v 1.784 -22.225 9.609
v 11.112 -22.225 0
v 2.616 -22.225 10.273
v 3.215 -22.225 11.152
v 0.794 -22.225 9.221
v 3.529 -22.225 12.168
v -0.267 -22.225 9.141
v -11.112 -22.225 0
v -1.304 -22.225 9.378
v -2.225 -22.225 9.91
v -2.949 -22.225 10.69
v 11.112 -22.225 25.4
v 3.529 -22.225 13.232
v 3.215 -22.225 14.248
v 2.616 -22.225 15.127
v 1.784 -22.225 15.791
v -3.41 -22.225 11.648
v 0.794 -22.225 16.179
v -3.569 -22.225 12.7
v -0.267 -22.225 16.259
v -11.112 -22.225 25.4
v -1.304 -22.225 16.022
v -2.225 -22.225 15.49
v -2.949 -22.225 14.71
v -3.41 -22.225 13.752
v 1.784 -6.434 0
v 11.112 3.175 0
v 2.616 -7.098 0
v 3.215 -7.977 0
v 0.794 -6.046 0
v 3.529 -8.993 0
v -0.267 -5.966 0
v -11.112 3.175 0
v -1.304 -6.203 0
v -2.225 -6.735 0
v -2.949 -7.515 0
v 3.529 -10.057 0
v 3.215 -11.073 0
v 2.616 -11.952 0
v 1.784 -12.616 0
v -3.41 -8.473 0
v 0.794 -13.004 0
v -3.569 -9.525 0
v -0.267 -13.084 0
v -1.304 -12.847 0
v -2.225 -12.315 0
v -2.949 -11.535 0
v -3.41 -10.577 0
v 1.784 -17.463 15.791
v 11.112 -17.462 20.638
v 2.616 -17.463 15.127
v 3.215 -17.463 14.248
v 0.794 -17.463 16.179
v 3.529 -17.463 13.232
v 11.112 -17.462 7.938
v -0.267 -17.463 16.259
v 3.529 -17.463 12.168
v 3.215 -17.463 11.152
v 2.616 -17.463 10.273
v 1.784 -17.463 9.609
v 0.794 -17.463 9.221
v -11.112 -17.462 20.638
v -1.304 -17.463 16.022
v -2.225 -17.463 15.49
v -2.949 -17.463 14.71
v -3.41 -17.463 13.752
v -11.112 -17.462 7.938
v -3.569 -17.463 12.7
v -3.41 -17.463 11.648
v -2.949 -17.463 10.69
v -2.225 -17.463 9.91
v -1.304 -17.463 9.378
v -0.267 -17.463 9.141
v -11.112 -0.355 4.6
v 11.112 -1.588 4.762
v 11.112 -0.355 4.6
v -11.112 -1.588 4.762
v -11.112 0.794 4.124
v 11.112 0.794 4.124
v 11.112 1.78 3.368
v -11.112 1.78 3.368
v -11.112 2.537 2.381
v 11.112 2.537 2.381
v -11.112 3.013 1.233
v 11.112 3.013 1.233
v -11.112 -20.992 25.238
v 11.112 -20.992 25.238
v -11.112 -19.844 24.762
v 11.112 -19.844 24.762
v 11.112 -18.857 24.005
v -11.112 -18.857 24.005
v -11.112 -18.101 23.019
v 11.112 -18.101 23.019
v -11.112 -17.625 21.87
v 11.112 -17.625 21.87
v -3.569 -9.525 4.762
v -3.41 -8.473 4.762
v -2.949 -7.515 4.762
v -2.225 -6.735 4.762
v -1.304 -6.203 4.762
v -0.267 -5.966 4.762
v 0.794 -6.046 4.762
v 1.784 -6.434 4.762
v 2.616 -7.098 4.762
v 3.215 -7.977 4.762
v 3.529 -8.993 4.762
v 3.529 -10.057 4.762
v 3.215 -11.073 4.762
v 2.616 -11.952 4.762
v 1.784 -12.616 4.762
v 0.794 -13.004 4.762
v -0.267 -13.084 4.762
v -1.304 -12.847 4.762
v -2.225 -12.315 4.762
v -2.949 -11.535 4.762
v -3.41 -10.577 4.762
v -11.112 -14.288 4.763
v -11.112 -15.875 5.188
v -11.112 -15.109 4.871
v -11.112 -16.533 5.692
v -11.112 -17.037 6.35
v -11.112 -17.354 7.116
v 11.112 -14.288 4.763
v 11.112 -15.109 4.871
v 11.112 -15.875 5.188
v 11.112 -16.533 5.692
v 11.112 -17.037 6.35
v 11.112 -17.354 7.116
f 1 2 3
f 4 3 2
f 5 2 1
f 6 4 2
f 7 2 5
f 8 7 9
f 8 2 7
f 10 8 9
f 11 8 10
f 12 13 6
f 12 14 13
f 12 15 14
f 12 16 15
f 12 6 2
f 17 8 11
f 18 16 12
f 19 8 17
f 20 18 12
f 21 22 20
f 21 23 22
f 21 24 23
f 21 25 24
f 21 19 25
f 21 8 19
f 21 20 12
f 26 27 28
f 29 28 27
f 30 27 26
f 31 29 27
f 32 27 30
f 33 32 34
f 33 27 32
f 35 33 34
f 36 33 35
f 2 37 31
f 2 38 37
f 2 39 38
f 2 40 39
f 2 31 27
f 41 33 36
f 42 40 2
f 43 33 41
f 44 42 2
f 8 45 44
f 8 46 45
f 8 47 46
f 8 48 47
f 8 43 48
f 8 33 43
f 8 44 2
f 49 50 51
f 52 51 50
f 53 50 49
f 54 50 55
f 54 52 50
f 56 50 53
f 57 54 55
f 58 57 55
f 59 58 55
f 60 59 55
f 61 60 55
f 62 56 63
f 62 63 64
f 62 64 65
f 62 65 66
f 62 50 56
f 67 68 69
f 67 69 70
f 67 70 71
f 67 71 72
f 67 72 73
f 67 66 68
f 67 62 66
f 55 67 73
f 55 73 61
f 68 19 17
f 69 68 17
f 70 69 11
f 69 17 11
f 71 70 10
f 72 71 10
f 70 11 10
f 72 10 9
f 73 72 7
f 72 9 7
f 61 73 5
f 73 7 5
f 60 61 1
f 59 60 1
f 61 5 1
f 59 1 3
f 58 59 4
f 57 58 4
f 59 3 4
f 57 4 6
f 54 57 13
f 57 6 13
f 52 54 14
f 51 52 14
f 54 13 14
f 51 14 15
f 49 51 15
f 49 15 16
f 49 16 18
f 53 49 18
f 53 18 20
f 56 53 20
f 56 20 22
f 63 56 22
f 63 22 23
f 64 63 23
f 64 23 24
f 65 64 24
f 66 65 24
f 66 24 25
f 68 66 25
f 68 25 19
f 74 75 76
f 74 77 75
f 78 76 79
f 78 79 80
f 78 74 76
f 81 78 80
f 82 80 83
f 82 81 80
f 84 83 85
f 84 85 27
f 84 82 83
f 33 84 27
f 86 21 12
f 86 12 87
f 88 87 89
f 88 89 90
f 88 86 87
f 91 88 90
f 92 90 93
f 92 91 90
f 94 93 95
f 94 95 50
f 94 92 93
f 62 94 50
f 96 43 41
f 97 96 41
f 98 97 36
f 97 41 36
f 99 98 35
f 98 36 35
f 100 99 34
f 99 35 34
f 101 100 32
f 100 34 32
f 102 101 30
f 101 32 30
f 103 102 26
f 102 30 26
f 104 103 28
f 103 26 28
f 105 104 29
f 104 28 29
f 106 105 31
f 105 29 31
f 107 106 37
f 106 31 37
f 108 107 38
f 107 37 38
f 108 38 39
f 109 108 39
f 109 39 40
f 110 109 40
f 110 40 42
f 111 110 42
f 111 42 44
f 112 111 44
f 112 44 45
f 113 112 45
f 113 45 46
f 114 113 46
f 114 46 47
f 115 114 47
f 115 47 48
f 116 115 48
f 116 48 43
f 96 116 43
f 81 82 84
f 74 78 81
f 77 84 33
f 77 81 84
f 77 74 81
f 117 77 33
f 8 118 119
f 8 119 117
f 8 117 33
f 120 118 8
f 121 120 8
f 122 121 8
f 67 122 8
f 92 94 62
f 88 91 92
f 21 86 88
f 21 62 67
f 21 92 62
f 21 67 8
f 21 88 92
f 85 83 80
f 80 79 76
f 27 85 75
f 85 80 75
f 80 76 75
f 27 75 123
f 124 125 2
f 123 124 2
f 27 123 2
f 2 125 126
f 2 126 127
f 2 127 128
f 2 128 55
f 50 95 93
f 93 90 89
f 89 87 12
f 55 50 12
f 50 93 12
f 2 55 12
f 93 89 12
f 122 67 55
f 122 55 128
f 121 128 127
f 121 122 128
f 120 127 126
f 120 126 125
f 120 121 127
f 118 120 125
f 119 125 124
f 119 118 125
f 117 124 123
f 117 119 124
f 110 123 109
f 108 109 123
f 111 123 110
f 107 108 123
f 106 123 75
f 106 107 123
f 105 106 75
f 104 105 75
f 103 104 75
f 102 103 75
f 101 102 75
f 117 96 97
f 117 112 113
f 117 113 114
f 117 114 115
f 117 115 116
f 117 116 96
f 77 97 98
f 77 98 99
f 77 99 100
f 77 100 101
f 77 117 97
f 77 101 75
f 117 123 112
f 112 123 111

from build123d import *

# Parameters (mm, degrees)
BOSS_EXTRUDE1_DEPTH = 11.1125
SKETCH6_R           = 3.5687
CUT_EXTRUDE1_DEPTH  = 7.62
SKETCH7_R           = 3.5687
CUT_EXTRUDE2_DEPTH  = 7.62


with BuildPart() as part:
    # Sketch1 → Boss-Extrude1 (new body, symmetric)
    with BuildSketch(Plane(origin=(0, -22.225, 0), x_dir=(0, -1, 0), z_dir=(-1, 0, 0))):
        with BuildLine():
            Line((0, 0), (0, 25.4))
            ThreePointArc((0, 25.4), (-3.367596045, 24.005096045), (-4.7625, 20.6375))
            Line((-4.7625, 20.6375), (-4.7625, 7.9375))
            ThreePointArc((-4.7625, 7.9375), (-5.69243597, 5.69243597), (-7.9375, 4.7625))
            Line((-7.9375, 4.7625), (-20.6375, 4.7625))
            ThreePointArc((-20.6375, 4.7625), (-24.005096045, 3.367596045), (-25.4, 0))
            Line((-25.4, 0), (0, 0))
        make_face()
    extrude(amount=BOSS_EXTRUDE1_DEPTH, both=True)

    # Sketch6 → Cut-Extrude1 (cut)
    with BuildSketch(Plane(origin=(0, -22.225, 0), x_dir=(-1, 0, 0), z_dir=(0, -1, 0))):
        with Locations((0, -12.7)):
            Circle(SKETCH6_R)
    extrude(amount=-CUT_EXTRUDE1_DEPTH, mode=Mode.SUBTRACT)

    # Sketch7 → Cut-Extrude2 (cut)
    with BuildSketch(Plane(origin=(0, 0, 0), x_dir=(-1, 0, 0), z_dir=(0, 0, -1))):
        with Locations((0, -9.525)):
            Circle(SKETCH7_R)
    extrude(amount=-CUT_EXTRUDE2_DEPTH, mode=Mode.SUBTRACT)


solid = part.part
